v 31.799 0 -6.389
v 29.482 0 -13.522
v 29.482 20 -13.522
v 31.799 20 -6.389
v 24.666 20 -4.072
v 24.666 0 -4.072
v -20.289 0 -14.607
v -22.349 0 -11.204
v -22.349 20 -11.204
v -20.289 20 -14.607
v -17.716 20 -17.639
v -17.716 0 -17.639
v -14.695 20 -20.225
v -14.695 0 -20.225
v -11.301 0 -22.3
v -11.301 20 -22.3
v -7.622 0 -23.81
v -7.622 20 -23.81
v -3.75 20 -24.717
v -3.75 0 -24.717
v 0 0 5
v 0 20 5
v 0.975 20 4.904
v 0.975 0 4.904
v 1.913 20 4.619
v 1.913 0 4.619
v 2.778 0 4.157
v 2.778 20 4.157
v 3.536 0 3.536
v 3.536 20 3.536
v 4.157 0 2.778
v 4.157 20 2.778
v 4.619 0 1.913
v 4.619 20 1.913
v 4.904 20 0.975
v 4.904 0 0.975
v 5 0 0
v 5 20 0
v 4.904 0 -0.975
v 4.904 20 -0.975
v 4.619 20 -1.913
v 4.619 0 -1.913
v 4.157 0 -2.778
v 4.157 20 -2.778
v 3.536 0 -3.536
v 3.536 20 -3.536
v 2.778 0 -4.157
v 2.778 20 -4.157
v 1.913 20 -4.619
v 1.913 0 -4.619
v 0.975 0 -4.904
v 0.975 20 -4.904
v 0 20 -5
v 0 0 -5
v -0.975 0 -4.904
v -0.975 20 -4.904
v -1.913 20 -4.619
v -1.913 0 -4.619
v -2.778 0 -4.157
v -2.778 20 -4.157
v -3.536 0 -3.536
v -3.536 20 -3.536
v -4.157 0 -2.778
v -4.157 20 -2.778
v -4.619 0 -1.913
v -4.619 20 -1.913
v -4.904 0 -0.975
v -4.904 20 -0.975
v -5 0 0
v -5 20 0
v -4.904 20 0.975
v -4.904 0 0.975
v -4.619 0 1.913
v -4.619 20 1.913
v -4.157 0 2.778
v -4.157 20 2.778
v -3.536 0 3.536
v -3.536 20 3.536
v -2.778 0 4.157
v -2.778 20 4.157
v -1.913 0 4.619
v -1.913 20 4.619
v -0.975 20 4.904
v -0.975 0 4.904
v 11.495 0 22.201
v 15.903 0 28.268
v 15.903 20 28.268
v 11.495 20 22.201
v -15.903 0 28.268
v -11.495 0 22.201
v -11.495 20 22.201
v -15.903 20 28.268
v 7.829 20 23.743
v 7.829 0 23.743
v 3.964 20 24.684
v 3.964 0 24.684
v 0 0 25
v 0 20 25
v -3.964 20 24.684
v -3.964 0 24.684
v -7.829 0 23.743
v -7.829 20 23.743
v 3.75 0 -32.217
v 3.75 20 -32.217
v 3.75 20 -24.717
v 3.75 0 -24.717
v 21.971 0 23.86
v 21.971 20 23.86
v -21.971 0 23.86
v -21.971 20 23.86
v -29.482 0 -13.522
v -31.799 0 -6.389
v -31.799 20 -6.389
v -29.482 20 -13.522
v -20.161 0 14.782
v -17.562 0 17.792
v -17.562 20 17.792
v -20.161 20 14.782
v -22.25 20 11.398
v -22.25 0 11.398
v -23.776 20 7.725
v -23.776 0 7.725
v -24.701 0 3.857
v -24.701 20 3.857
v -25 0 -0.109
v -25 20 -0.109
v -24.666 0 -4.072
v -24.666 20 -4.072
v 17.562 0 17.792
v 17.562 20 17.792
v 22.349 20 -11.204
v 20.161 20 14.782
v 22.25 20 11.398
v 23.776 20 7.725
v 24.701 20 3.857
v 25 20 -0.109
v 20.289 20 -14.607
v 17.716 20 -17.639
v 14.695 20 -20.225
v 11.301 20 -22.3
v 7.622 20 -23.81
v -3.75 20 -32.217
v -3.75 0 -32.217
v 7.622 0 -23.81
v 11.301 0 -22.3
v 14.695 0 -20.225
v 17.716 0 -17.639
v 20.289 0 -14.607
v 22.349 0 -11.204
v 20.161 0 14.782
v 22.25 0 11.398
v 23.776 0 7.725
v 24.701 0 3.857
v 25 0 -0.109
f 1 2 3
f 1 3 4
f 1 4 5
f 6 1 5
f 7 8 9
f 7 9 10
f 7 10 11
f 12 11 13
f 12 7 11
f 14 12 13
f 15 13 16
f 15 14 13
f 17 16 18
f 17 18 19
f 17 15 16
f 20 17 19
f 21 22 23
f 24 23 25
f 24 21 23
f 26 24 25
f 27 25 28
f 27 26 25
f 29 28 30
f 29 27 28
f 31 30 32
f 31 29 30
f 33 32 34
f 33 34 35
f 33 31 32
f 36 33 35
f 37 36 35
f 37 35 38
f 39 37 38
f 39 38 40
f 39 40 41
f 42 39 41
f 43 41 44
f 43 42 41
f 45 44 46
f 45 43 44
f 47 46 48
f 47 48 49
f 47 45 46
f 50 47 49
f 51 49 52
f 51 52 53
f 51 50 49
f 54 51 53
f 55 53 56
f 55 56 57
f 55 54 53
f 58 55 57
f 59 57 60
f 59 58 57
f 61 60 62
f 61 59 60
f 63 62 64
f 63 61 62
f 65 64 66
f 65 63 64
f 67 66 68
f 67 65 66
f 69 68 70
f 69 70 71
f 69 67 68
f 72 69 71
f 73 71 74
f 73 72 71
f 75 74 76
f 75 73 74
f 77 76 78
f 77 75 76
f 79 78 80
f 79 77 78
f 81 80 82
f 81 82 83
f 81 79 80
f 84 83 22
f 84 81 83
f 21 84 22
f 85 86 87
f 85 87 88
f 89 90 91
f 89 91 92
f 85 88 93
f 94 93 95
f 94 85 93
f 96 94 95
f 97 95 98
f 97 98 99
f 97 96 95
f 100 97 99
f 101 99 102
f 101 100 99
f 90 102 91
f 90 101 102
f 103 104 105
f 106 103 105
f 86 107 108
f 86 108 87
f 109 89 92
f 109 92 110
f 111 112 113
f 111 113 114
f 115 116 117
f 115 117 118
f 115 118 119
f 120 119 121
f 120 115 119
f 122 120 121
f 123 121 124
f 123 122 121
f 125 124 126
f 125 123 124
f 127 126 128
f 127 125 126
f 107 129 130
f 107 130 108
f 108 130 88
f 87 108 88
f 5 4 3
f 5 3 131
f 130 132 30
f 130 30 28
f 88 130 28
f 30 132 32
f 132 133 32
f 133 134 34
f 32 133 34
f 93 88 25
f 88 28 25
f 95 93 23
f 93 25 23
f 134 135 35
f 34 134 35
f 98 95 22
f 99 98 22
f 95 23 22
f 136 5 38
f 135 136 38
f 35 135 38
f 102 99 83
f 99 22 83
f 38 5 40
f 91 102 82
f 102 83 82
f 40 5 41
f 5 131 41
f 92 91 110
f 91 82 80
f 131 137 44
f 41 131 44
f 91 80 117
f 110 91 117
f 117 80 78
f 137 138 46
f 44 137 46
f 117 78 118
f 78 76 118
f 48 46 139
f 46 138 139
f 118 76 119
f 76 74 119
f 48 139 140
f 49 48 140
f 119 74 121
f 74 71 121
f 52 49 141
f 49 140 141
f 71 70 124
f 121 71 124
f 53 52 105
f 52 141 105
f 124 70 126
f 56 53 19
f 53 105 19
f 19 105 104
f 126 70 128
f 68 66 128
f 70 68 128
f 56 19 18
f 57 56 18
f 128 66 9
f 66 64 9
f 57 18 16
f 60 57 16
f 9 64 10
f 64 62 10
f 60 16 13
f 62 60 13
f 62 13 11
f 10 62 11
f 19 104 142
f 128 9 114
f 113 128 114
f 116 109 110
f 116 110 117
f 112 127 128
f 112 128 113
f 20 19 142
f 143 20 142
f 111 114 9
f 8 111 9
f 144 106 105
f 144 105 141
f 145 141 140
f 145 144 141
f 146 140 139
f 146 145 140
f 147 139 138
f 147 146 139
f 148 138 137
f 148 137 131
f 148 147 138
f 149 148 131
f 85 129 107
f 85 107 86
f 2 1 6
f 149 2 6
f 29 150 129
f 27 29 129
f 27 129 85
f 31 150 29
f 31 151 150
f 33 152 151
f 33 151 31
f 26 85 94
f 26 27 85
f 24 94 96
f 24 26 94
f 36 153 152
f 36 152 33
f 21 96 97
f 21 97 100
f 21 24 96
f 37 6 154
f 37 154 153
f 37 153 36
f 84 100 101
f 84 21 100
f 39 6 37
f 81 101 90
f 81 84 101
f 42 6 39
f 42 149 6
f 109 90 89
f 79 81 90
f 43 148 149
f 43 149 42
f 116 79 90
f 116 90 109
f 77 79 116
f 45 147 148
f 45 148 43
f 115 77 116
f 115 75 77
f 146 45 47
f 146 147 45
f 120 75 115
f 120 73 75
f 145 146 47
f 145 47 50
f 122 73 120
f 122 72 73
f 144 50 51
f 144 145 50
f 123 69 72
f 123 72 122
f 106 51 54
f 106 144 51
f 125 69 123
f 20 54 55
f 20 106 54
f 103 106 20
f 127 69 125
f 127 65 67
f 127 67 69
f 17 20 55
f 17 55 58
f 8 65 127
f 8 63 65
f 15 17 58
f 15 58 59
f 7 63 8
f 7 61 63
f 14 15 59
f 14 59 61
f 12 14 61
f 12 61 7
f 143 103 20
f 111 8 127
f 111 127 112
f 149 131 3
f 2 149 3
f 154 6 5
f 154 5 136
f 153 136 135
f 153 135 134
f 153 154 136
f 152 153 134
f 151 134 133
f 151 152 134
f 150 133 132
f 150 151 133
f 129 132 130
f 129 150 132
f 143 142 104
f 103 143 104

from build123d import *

# Parameters (mm, degrees)
SKETCH1_R           = 5
BOSS_EXTRUDE1_DEPTH = 20


with BuildPart() as part:
    # Sketch1 → Boss-Extrude1 (new body)
    with BuildSketch(Plane(origin=(0, 0, 0), x_dir=(1, 0, 0), z_dir=(0, 1, 0))):
        with BuildLine():
            Line((29.481516636, 13.522108771), (31.799144094, 6.389184898))
            Line((31.799144094, 6.389184898), (24.666220221, 4.071557441))
            ThreePointArc((24.666220221, 4.071557441), (23.776412907, -7.725424859), (17.562189929, -17.792399639))
            Line((17.562189929, -17.792399639), (21.970579321, -23.860027097))
            Line((21.970579321, -23.860027097), (15.902951863, -28.268416489))
            Line((15.902951863, -28.268416489), (11.494562471, -22.200789031))
            ThreePointArc((11.494562471, -22.200789031), (0, -25), (-11.494562471, -22.200789031))
            Line((-11.494562471, -22.200789031), (-15.902951863, -28.268416489))
            Line((-15.902951863, -28.268416489), (-21.970579321, -23.860027097))
            Line((-21.970579321, -23.860027097), (-17.562189929, -17.792399639))
            ThreePointArc((-17.562189929, -17.792399639), (-23.776412907, -7.725424859), (-24.666220221, 4.071557441))
            Line((-24.666220221, 4.071557441), (-31.799144094, 6.389184898))
            Line((-31.799144094, 6.389184898), (-29.481516636, 13.522108771))
            Line((-29.481516636, 13.522108771), (-22.348592764, 11.204481313))
            ThreePointArc((-22.348592764, 11.204481313), (-14.694631307, 20.225424859), (-3.75, 24.717149917))
            Line((-3.75, 24.717149917), (-3.75, 32.217149917))
            Line((-3.75, 32.217149917), (3.75, 32.217149917))
            Line((3.75, 32.217149917), (3.75, 24.717149917))
            ThreePointArc((3.75, 24.717149917), (14.694631307, 20.225424859), (22.348592764, 11.204481313))
            Line((22.348592764, 11.204481313), (29.481516636, 13.522108771))
        make_face()
        with Locations(Location((0, 0, 0), (0, 0, 270))):
            Circle(SKETCH1_R, mode=Mode.SUBTRACT)
    extrude(amount=BOSS_EXTRUDE1_DEPTH)


solid = part.part
